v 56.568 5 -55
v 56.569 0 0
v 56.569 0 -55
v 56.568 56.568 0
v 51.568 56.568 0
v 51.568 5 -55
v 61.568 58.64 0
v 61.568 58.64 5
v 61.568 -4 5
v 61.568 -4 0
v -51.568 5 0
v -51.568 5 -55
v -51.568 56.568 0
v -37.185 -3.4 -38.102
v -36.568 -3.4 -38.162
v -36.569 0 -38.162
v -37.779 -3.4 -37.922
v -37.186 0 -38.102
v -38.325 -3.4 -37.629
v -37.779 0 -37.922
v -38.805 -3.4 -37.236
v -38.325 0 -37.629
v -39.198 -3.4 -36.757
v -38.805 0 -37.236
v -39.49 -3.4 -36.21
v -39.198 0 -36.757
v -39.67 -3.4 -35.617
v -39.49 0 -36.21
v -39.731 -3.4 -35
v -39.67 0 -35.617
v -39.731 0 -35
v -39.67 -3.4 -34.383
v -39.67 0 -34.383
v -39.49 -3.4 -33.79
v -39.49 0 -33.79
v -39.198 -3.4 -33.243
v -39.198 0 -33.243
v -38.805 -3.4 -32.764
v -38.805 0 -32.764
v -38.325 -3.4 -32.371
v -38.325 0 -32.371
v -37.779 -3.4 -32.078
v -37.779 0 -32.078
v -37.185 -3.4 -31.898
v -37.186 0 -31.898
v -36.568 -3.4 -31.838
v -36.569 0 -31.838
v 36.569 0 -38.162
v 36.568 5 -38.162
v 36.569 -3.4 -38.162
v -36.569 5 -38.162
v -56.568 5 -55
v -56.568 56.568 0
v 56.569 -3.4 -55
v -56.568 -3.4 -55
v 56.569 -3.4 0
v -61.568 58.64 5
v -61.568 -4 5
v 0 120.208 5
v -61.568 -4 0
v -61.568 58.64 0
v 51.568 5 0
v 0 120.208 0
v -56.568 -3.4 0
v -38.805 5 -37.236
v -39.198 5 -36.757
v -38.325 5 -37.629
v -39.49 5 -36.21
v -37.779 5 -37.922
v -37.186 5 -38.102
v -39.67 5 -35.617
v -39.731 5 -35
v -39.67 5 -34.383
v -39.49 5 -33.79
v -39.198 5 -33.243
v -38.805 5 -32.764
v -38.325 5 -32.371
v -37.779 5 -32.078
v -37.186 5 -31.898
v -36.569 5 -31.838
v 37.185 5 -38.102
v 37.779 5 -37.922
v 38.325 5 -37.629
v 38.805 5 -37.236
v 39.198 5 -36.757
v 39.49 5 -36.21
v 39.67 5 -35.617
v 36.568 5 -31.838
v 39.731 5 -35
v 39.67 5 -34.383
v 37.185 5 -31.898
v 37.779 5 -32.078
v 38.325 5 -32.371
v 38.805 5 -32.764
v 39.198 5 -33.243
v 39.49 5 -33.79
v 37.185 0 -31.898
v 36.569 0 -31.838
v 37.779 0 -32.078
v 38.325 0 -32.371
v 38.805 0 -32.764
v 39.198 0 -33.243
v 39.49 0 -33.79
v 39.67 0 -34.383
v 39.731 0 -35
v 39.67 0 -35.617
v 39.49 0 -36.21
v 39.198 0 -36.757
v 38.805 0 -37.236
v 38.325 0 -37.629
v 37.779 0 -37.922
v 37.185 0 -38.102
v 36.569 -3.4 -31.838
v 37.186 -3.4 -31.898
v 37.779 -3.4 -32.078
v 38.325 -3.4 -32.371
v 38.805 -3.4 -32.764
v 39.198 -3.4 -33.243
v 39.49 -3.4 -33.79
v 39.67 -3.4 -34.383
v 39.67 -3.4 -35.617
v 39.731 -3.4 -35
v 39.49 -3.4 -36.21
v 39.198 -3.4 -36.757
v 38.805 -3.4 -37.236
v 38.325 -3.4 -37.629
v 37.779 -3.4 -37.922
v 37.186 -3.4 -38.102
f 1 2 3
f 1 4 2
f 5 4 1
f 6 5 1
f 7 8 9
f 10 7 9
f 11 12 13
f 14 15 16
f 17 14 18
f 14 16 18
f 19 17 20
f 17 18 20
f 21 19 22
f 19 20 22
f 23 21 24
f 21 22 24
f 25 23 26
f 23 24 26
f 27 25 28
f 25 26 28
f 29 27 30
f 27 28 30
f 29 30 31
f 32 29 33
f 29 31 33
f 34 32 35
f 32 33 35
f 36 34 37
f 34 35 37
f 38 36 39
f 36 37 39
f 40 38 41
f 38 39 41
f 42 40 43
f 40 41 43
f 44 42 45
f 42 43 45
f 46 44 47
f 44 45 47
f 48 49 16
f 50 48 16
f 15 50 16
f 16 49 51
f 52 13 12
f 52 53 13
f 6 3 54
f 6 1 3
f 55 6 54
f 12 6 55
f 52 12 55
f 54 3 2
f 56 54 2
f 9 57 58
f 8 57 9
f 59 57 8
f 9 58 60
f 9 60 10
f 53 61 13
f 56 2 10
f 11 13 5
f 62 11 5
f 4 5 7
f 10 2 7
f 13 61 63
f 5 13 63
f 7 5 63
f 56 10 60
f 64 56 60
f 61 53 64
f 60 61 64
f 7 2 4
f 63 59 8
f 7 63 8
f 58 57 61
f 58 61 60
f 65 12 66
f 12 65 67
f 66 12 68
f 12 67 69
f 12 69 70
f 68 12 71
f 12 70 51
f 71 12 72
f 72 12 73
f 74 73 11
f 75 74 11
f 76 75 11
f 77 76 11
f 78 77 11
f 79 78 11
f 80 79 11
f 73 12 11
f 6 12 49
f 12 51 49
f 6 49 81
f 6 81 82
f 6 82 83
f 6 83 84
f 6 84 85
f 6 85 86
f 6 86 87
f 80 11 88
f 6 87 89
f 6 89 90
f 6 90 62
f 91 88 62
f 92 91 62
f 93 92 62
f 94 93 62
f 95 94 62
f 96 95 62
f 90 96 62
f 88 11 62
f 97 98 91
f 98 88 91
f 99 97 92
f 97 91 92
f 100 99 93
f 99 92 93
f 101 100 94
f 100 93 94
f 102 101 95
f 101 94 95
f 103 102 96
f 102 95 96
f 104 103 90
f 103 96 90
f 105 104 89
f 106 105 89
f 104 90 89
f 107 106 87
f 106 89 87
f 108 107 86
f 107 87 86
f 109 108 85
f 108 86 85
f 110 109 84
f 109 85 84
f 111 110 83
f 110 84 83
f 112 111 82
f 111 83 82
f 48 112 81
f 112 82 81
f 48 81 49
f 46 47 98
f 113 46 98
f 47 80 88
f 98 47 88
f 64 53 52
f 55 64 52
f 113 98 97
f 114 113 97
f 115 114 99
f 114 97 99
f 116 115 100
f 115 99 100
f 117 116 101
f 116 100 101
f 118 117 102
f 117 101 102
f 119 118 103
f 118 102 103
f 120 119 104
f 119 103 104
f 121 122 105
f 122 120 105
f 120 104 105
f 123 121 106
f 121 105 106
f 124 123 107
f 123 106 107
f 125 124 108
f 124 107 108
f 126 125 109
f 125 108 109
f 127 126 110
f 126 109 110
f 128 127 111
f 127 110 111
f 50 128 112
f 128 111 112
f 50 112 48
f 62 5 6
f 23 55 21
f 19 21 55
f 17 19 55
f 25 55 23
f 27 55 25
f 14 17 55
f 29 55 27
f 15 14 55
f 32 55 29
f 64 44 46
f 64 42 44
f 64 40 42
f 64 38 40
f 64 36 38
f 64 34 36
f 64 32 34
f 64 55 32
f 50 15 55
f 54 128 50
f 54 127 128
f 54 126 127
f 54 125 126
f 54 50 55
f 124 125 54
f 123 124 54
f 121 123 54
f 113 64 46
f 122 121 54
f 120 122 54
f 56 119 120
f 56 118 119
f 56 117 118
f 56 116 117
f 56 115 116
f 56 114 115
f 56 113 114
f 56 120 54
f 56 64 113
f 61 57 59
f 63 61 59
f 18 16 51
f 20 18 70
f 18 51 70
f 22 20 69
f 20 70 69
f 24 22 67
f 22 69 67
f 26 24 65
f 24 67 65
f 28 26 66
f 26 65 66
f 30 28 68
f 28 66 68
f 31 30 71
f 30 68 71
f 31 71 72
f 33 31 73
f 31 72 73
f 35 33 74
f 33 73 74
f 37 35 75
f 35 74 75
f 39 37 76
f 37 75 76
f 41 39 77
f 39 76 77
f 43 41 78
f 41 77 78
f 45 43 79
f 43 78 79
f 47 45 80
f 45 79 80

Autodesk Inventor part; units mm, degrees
ref_plane "YZ Plane" through (0, 0, 0) normal (1, 0, 0) x (0, 1, 0)
ref_plane "XZ Plane" through (0, 0, 0) normal (0, 1, 0) x (-1, 0, 0)
ref_plane "XY Plane" through (0, 0, 0) normal (0, 0, 1) x (1, 0, 0)
sketch "Skizze1" plane through (0, 0, 0) normal (0, 0, 1) x (1, 0, 0)
  line L0 (0, 113.1371) -> (56.5685, 56.5685)
  line L1 (56.5685, 56.5685) -> (0, 0) construction
  line L2 (0, 0) -> (-56.5685, 56.5685) construction
  line L3 (-56.5685, 56.5685) -> (0, 113.1371)
  line L4 (0, 0) -> (-109.9706, 0) construction
  line L5 (-56.5685, 56.5685) -> (-56.5685, 0)
  line L6 (56.5685, 56.5685) -> (56.5685, 0)
  line L7 (-56.5685, 0) -> (56.5685, 0)
  dimension "d0" = 45
  dimension "d1" = 80
extrude "Extrusion1" add sketch "Skizze1" along normal blind 5
sketch "Skizze2" plane through (0, 0, 0) normal (0, 0, -1) x (-1, 0, 0)
  line L0 (-56.5685, 0) -> (56.5685, 0)
  line L1 (56.5685, 0) -> (56.5685, 5)
  line L2 (56.5685, 5) -> (-56.5685, 5)
  line L3 (-56.5685, 5) -> (-56.5685, 0)
  line L4 (56.5685, 0) -> (-56.5685, 0) construction
  line L5 (56.5685, 56.5685) -> (56.5685, 0) construction
  line L6 (0, 113.1371) -> (56.5685, 56.5685) construction
  line L7 (-56.5685, 56.5685) -> (0, 113.1371) construction
  line L8 (-56.5685, 0) -> (-56.5685, 56.5685) construction
  point P0 (0, 0)
  dimension "d4" = 5
extrude "Extrusion2" add sketch "Skizze2" along normal blind 55
sketch "Skizze3" plane through (56.5685, 0, 5) normal (1, 0, 0) x (0, 0, -1)
  line L0 (5, 5) -> (5, 56.5685) construction
  line L1 (5, 5) -> (60, 5) construction
  line L2 (5, 56.5685) -> (60, 5)
  line L3 (60, 5) -> (5, 5)
  line L4 (5, 5) -> (5, 56.5685)
  point P0 (5, 0)
extrude "Extrusion3" add sketch "Skizze3" against normal blind 5
sketch "Skizze4" plane through (-56.5685, 0, 5) normal (-1, 0, 0) x (0, 0, 1)
  line L0 (-5, 5) -> (-60, 5) projected
  line L1 (-5, 56.5685) -> (-5, 5) projected
  line L2 (-5, 56.5685) -> (-60, 5) projected
  point P0 (-5, 0)
extrude "Extrusion4" add sketch "Skizze4" against normal blind 5
sketch "Skizze5" plane through (51.5685, 5, 0) normal (0, 1, 0) x (1, 0, 0)
  line L0 (-15, 35) -> (-88.1371, 35) construction
  line L1 (-15, 38.1623) -> (-88.1371, 38.1623)
  line L2 (-88.1371, 31.8377) -> (-15, 31.8377)
  arc A0 (-15, 31.8377) -> (-15, 38.1623) centre (-15, 35) ccw
  arc A1 (-88.1371, 38.1623) -> (-88.1371, 31.8377) centre (-88.1371, 35) ccw
  line L3 (-103.1371, 55) -> (-103.1371, 0) construction
  line L4 (0, 0) -> (-103.1371, 0) construction
  line L5 (0, 0) -> (0, 55) construction
  line L6 (-103.1371, 55) -> (0, 55) construction
  point P0 (-51.5685, 0)
  point P1 (-51.5685, 35)
  dimension "d11" = 20
  dimension "d12" = 15
  dimension "d13" = 15
extrude "Extrusion5" cut sketch "Skizze5" against normal through all
sketch "Skizze6" plane through (0, 0, 5) normal (0, 0, 1) x (1, 0, 0)
  line L0 (-56.5685, 0) -> (56.5685, 0) projected
  line L1 (56.5685, 0) -> (56.5685, 56.5685) projected
  line L2 (56.5685, 56.5685) -> (0, 113.1371) projected
  line L3 (0, 113.1371) -> (-56.5685, 56.5685) projected
  line L4 (-56.5685, 56.5685) -> (-56.5685, 0) projected
  line L5 (-61.5685, 58.6396) -> (0, 120.2082)
  line L6 (0, 120.2082) -> (61.5685, 58.6396)
  line L7 (61.5685, 58.6396) -> (61.5685, -4)
  line L8 (-61.5685, 58.6396) -> (-61.5685, -4)
  line L9 (-61.5685, -4) -> (61.5685, -4)
  line L10 (56.5685, 56.5685) -> (0, 113.1371) projected
  line L11 (-56.5685, 0) -> (56.5685, 0) projected
  point P0 (0, 0)
  dimension "d16" = 5
  dimension "d17" = 5
  dimension "d18" = 5
  dimension "d19" = 5
  dimension "d20" = 4
extrude "Extrusion6" add sketch "Skizze6" against normal up to surface (5 mm away)
sketch "Skizze7" plane through (-56.5685, 0, 0) normal (0, -1, 0) x (1, 0, 0)
  line L0 (113.1371, 0) -> (0, 0) projected
  line L1 (0, 0) -> (0, -55) projected
  line L2 (113.1371, -55) -> (0, -55) projected
  line L3 (113.1371, -55) -> (113.1371, 0) projected
  line L4 (20, -31.8377) -> (93.1371, -31.8377) projected
  arc A0 (93.1371, -38.1623) -> (93.1371, -31.8377) centre (93.1371, -35) ccw projected
  line L5 (93.1371, -38.1623) -> (20, -38.1623) projected
  arc A1 (20, -31.8377) -> (20, -38.1623) centre (20, -35) ccw projected
  point P0 (56.5685, 0)
extrude "Extrusion7" add sketch "Skizze7" along normal blind 3.4
sketch "Skizze8" plane through (0, 0, -55) normal (0, 0, -1) x (-1, 0, 0)
  line L0 (56.5685, -3.4) -> (56.5685, 56.5685) construction
  line L1 (56.5685, -3.4) -> (-56.5685, -3.4) construction
  line L2 (-56.5685, -3.4) -> (-56.5685, 56.5685) construction
  line L3 (-56.5685, 56.5685) -> (-51.5685, 56.5685) construction
  line L4 (-51.5685, 56.5685) -> (-51.5685, 5) construction
  line L5 (-51.5685, 5) -> (51.5685, 5) construction
  line L6 (51.5685, 5) -> (51.5685, 56.5685) construction
  line L7 (51.5685, 56.5685) -> (56.5685, 56.5685) construction
  line L8 (0, 120.2082) -> (-61.5685, 58.6396) construction
  line L9 (-61.5685, 58.6396) -> (-61.5685, -4) construction
  line L10 (-61.5685, -4) -> (61.5685, -4) construction
  line L11 (61.5685, -4) -> (61.5685, 58.6396) construction
  line L12 (61.5685, 58.6396) -> (0, 120.2082) construction
  line L13 (96.047, 0) -> (96.047, 100) construction
  point P0 (0, 0)
  dimension "d25" = 96.047
properties part number "Halterung_ID6"
